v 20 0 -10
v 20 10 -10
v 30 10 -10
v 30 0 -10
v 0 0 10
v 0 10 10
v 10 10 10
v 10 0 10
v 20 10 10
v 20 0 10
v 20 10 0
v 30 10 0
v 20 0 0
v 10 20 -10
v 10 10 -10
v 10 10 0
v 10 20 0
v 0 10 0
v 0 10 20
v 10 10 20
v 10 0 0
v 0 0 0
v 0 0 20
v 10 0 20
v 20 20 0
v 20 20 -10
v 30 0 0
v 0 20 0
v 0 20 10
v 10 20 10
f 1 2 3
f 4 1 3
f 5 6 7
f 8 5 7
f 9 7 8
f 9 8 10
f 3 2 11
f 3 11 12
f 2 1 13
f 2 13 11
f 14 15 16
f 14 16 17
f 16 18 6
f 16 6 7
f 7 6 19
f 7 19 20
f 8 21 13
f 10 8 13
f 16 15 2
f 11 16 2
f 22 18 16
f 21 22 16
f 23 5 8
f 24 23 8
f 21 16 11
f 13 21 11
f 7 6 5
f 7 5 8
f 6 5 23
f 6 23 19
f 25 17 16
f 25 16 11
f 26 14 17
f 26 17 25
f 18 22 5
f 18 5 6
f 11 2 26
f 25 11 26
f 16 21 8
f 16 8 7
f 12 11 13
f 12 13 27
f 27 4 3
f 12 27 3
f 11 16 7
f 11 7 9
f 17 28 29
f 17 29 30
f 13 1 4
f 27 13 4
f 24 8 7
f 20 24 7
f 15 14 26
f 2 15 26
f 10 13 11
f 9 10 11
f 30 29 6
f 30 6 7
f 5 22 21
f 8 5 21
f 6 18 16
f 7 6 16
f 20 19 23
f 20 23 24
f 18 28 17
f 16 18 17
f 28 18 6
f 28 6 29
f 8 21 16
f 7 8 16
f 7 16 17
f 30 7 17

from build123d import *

# Parameters (mm, degrees)
BOX_W        = 10
BOX_H        = 10
BOX_DEPTH    = 10
BOX001_W     = 10
BOX001_H     = 10
BOX001_DEPTH = 10
BOX002_W     = 10
BOX002_H     = 10
BOX002_DEPTH = 10
BOX003_W     = 10
BOX003_H     = 10
BOX003_DEPTH = 10
BOX004_W     = 10
BOX004_H     = 10
BOX004_DEPTH = 10
BOX005_W     = 10
BOX005_H     = 10
BOX005_DEPTH = 10


with BuildPart() as box:
    # Box → Box (new body)
    with BuildSketch(Plane.XY.offset(10)):
        with Locations((5, 5)):
            Rectangle(BOX_W, BOX_H)
    extrude(amount=BOX_DEPTH)


with BuildPart() as box001:
    # Box001 → Box001 (new body)
    with BuildSketch(Plane(origin=(0, 10, 0), x_dir=(1, 0, 0), z_dir=(0, 0, 1))):
        with Locations((5, 5)):
            Rectangle(BOX001_W, BOX001_H)
    extrude(amount=BOX001_DEPTH)


with BuildPart() as box002:
    # Box002 → Box002 (new body)
    with BuildSketch(Plane(origin=(10, 0, 0), x_dir=(1, 0, 0), z_dir=(0, 0, 1))):
        with Locations((5, 5)):
            Rectangle(BOX002_W, BOX002_H)
    extrude(amount=BOX002_DEPTH)


with BuildPart() as box003:
    # Box003 → Box003 (new body)
    with BuildSketch(Plane(origin=(20, 0, -10), x_dir=(1, 0, 0), z_dir=(0, 0, 1))):
        with Locations((5, 5)):
            Rectangle(BOX003_W, BOX003_H)
    extrude(amount=BOX003_DEPTH)


with BuildPart() as box004:
    # Box004 → Box004 (new body)
    with BuildSketch(Plane(origin=(10, 10, -10), x_dir=(1, 0, 0), z_dir=(0, 0, 1))):
        with Locations((5, 5)):
            Rectangle(BOX004_W, BOX004_H)
    extrude(amount=BOX004_DEPTH)


with BuildPart() as box005:
    # Box005 → Box005 (new body)
    with BuildSketch(Plane.XY):
        with Locations((5, 5)):
            Rectangle(BOX005_W, BOX005_H)
    extrude(amount=BOX005_DEPTH)


solid = Compound([box.part, box001.part, box002.part, box003.part, box004.part, box005.part])
